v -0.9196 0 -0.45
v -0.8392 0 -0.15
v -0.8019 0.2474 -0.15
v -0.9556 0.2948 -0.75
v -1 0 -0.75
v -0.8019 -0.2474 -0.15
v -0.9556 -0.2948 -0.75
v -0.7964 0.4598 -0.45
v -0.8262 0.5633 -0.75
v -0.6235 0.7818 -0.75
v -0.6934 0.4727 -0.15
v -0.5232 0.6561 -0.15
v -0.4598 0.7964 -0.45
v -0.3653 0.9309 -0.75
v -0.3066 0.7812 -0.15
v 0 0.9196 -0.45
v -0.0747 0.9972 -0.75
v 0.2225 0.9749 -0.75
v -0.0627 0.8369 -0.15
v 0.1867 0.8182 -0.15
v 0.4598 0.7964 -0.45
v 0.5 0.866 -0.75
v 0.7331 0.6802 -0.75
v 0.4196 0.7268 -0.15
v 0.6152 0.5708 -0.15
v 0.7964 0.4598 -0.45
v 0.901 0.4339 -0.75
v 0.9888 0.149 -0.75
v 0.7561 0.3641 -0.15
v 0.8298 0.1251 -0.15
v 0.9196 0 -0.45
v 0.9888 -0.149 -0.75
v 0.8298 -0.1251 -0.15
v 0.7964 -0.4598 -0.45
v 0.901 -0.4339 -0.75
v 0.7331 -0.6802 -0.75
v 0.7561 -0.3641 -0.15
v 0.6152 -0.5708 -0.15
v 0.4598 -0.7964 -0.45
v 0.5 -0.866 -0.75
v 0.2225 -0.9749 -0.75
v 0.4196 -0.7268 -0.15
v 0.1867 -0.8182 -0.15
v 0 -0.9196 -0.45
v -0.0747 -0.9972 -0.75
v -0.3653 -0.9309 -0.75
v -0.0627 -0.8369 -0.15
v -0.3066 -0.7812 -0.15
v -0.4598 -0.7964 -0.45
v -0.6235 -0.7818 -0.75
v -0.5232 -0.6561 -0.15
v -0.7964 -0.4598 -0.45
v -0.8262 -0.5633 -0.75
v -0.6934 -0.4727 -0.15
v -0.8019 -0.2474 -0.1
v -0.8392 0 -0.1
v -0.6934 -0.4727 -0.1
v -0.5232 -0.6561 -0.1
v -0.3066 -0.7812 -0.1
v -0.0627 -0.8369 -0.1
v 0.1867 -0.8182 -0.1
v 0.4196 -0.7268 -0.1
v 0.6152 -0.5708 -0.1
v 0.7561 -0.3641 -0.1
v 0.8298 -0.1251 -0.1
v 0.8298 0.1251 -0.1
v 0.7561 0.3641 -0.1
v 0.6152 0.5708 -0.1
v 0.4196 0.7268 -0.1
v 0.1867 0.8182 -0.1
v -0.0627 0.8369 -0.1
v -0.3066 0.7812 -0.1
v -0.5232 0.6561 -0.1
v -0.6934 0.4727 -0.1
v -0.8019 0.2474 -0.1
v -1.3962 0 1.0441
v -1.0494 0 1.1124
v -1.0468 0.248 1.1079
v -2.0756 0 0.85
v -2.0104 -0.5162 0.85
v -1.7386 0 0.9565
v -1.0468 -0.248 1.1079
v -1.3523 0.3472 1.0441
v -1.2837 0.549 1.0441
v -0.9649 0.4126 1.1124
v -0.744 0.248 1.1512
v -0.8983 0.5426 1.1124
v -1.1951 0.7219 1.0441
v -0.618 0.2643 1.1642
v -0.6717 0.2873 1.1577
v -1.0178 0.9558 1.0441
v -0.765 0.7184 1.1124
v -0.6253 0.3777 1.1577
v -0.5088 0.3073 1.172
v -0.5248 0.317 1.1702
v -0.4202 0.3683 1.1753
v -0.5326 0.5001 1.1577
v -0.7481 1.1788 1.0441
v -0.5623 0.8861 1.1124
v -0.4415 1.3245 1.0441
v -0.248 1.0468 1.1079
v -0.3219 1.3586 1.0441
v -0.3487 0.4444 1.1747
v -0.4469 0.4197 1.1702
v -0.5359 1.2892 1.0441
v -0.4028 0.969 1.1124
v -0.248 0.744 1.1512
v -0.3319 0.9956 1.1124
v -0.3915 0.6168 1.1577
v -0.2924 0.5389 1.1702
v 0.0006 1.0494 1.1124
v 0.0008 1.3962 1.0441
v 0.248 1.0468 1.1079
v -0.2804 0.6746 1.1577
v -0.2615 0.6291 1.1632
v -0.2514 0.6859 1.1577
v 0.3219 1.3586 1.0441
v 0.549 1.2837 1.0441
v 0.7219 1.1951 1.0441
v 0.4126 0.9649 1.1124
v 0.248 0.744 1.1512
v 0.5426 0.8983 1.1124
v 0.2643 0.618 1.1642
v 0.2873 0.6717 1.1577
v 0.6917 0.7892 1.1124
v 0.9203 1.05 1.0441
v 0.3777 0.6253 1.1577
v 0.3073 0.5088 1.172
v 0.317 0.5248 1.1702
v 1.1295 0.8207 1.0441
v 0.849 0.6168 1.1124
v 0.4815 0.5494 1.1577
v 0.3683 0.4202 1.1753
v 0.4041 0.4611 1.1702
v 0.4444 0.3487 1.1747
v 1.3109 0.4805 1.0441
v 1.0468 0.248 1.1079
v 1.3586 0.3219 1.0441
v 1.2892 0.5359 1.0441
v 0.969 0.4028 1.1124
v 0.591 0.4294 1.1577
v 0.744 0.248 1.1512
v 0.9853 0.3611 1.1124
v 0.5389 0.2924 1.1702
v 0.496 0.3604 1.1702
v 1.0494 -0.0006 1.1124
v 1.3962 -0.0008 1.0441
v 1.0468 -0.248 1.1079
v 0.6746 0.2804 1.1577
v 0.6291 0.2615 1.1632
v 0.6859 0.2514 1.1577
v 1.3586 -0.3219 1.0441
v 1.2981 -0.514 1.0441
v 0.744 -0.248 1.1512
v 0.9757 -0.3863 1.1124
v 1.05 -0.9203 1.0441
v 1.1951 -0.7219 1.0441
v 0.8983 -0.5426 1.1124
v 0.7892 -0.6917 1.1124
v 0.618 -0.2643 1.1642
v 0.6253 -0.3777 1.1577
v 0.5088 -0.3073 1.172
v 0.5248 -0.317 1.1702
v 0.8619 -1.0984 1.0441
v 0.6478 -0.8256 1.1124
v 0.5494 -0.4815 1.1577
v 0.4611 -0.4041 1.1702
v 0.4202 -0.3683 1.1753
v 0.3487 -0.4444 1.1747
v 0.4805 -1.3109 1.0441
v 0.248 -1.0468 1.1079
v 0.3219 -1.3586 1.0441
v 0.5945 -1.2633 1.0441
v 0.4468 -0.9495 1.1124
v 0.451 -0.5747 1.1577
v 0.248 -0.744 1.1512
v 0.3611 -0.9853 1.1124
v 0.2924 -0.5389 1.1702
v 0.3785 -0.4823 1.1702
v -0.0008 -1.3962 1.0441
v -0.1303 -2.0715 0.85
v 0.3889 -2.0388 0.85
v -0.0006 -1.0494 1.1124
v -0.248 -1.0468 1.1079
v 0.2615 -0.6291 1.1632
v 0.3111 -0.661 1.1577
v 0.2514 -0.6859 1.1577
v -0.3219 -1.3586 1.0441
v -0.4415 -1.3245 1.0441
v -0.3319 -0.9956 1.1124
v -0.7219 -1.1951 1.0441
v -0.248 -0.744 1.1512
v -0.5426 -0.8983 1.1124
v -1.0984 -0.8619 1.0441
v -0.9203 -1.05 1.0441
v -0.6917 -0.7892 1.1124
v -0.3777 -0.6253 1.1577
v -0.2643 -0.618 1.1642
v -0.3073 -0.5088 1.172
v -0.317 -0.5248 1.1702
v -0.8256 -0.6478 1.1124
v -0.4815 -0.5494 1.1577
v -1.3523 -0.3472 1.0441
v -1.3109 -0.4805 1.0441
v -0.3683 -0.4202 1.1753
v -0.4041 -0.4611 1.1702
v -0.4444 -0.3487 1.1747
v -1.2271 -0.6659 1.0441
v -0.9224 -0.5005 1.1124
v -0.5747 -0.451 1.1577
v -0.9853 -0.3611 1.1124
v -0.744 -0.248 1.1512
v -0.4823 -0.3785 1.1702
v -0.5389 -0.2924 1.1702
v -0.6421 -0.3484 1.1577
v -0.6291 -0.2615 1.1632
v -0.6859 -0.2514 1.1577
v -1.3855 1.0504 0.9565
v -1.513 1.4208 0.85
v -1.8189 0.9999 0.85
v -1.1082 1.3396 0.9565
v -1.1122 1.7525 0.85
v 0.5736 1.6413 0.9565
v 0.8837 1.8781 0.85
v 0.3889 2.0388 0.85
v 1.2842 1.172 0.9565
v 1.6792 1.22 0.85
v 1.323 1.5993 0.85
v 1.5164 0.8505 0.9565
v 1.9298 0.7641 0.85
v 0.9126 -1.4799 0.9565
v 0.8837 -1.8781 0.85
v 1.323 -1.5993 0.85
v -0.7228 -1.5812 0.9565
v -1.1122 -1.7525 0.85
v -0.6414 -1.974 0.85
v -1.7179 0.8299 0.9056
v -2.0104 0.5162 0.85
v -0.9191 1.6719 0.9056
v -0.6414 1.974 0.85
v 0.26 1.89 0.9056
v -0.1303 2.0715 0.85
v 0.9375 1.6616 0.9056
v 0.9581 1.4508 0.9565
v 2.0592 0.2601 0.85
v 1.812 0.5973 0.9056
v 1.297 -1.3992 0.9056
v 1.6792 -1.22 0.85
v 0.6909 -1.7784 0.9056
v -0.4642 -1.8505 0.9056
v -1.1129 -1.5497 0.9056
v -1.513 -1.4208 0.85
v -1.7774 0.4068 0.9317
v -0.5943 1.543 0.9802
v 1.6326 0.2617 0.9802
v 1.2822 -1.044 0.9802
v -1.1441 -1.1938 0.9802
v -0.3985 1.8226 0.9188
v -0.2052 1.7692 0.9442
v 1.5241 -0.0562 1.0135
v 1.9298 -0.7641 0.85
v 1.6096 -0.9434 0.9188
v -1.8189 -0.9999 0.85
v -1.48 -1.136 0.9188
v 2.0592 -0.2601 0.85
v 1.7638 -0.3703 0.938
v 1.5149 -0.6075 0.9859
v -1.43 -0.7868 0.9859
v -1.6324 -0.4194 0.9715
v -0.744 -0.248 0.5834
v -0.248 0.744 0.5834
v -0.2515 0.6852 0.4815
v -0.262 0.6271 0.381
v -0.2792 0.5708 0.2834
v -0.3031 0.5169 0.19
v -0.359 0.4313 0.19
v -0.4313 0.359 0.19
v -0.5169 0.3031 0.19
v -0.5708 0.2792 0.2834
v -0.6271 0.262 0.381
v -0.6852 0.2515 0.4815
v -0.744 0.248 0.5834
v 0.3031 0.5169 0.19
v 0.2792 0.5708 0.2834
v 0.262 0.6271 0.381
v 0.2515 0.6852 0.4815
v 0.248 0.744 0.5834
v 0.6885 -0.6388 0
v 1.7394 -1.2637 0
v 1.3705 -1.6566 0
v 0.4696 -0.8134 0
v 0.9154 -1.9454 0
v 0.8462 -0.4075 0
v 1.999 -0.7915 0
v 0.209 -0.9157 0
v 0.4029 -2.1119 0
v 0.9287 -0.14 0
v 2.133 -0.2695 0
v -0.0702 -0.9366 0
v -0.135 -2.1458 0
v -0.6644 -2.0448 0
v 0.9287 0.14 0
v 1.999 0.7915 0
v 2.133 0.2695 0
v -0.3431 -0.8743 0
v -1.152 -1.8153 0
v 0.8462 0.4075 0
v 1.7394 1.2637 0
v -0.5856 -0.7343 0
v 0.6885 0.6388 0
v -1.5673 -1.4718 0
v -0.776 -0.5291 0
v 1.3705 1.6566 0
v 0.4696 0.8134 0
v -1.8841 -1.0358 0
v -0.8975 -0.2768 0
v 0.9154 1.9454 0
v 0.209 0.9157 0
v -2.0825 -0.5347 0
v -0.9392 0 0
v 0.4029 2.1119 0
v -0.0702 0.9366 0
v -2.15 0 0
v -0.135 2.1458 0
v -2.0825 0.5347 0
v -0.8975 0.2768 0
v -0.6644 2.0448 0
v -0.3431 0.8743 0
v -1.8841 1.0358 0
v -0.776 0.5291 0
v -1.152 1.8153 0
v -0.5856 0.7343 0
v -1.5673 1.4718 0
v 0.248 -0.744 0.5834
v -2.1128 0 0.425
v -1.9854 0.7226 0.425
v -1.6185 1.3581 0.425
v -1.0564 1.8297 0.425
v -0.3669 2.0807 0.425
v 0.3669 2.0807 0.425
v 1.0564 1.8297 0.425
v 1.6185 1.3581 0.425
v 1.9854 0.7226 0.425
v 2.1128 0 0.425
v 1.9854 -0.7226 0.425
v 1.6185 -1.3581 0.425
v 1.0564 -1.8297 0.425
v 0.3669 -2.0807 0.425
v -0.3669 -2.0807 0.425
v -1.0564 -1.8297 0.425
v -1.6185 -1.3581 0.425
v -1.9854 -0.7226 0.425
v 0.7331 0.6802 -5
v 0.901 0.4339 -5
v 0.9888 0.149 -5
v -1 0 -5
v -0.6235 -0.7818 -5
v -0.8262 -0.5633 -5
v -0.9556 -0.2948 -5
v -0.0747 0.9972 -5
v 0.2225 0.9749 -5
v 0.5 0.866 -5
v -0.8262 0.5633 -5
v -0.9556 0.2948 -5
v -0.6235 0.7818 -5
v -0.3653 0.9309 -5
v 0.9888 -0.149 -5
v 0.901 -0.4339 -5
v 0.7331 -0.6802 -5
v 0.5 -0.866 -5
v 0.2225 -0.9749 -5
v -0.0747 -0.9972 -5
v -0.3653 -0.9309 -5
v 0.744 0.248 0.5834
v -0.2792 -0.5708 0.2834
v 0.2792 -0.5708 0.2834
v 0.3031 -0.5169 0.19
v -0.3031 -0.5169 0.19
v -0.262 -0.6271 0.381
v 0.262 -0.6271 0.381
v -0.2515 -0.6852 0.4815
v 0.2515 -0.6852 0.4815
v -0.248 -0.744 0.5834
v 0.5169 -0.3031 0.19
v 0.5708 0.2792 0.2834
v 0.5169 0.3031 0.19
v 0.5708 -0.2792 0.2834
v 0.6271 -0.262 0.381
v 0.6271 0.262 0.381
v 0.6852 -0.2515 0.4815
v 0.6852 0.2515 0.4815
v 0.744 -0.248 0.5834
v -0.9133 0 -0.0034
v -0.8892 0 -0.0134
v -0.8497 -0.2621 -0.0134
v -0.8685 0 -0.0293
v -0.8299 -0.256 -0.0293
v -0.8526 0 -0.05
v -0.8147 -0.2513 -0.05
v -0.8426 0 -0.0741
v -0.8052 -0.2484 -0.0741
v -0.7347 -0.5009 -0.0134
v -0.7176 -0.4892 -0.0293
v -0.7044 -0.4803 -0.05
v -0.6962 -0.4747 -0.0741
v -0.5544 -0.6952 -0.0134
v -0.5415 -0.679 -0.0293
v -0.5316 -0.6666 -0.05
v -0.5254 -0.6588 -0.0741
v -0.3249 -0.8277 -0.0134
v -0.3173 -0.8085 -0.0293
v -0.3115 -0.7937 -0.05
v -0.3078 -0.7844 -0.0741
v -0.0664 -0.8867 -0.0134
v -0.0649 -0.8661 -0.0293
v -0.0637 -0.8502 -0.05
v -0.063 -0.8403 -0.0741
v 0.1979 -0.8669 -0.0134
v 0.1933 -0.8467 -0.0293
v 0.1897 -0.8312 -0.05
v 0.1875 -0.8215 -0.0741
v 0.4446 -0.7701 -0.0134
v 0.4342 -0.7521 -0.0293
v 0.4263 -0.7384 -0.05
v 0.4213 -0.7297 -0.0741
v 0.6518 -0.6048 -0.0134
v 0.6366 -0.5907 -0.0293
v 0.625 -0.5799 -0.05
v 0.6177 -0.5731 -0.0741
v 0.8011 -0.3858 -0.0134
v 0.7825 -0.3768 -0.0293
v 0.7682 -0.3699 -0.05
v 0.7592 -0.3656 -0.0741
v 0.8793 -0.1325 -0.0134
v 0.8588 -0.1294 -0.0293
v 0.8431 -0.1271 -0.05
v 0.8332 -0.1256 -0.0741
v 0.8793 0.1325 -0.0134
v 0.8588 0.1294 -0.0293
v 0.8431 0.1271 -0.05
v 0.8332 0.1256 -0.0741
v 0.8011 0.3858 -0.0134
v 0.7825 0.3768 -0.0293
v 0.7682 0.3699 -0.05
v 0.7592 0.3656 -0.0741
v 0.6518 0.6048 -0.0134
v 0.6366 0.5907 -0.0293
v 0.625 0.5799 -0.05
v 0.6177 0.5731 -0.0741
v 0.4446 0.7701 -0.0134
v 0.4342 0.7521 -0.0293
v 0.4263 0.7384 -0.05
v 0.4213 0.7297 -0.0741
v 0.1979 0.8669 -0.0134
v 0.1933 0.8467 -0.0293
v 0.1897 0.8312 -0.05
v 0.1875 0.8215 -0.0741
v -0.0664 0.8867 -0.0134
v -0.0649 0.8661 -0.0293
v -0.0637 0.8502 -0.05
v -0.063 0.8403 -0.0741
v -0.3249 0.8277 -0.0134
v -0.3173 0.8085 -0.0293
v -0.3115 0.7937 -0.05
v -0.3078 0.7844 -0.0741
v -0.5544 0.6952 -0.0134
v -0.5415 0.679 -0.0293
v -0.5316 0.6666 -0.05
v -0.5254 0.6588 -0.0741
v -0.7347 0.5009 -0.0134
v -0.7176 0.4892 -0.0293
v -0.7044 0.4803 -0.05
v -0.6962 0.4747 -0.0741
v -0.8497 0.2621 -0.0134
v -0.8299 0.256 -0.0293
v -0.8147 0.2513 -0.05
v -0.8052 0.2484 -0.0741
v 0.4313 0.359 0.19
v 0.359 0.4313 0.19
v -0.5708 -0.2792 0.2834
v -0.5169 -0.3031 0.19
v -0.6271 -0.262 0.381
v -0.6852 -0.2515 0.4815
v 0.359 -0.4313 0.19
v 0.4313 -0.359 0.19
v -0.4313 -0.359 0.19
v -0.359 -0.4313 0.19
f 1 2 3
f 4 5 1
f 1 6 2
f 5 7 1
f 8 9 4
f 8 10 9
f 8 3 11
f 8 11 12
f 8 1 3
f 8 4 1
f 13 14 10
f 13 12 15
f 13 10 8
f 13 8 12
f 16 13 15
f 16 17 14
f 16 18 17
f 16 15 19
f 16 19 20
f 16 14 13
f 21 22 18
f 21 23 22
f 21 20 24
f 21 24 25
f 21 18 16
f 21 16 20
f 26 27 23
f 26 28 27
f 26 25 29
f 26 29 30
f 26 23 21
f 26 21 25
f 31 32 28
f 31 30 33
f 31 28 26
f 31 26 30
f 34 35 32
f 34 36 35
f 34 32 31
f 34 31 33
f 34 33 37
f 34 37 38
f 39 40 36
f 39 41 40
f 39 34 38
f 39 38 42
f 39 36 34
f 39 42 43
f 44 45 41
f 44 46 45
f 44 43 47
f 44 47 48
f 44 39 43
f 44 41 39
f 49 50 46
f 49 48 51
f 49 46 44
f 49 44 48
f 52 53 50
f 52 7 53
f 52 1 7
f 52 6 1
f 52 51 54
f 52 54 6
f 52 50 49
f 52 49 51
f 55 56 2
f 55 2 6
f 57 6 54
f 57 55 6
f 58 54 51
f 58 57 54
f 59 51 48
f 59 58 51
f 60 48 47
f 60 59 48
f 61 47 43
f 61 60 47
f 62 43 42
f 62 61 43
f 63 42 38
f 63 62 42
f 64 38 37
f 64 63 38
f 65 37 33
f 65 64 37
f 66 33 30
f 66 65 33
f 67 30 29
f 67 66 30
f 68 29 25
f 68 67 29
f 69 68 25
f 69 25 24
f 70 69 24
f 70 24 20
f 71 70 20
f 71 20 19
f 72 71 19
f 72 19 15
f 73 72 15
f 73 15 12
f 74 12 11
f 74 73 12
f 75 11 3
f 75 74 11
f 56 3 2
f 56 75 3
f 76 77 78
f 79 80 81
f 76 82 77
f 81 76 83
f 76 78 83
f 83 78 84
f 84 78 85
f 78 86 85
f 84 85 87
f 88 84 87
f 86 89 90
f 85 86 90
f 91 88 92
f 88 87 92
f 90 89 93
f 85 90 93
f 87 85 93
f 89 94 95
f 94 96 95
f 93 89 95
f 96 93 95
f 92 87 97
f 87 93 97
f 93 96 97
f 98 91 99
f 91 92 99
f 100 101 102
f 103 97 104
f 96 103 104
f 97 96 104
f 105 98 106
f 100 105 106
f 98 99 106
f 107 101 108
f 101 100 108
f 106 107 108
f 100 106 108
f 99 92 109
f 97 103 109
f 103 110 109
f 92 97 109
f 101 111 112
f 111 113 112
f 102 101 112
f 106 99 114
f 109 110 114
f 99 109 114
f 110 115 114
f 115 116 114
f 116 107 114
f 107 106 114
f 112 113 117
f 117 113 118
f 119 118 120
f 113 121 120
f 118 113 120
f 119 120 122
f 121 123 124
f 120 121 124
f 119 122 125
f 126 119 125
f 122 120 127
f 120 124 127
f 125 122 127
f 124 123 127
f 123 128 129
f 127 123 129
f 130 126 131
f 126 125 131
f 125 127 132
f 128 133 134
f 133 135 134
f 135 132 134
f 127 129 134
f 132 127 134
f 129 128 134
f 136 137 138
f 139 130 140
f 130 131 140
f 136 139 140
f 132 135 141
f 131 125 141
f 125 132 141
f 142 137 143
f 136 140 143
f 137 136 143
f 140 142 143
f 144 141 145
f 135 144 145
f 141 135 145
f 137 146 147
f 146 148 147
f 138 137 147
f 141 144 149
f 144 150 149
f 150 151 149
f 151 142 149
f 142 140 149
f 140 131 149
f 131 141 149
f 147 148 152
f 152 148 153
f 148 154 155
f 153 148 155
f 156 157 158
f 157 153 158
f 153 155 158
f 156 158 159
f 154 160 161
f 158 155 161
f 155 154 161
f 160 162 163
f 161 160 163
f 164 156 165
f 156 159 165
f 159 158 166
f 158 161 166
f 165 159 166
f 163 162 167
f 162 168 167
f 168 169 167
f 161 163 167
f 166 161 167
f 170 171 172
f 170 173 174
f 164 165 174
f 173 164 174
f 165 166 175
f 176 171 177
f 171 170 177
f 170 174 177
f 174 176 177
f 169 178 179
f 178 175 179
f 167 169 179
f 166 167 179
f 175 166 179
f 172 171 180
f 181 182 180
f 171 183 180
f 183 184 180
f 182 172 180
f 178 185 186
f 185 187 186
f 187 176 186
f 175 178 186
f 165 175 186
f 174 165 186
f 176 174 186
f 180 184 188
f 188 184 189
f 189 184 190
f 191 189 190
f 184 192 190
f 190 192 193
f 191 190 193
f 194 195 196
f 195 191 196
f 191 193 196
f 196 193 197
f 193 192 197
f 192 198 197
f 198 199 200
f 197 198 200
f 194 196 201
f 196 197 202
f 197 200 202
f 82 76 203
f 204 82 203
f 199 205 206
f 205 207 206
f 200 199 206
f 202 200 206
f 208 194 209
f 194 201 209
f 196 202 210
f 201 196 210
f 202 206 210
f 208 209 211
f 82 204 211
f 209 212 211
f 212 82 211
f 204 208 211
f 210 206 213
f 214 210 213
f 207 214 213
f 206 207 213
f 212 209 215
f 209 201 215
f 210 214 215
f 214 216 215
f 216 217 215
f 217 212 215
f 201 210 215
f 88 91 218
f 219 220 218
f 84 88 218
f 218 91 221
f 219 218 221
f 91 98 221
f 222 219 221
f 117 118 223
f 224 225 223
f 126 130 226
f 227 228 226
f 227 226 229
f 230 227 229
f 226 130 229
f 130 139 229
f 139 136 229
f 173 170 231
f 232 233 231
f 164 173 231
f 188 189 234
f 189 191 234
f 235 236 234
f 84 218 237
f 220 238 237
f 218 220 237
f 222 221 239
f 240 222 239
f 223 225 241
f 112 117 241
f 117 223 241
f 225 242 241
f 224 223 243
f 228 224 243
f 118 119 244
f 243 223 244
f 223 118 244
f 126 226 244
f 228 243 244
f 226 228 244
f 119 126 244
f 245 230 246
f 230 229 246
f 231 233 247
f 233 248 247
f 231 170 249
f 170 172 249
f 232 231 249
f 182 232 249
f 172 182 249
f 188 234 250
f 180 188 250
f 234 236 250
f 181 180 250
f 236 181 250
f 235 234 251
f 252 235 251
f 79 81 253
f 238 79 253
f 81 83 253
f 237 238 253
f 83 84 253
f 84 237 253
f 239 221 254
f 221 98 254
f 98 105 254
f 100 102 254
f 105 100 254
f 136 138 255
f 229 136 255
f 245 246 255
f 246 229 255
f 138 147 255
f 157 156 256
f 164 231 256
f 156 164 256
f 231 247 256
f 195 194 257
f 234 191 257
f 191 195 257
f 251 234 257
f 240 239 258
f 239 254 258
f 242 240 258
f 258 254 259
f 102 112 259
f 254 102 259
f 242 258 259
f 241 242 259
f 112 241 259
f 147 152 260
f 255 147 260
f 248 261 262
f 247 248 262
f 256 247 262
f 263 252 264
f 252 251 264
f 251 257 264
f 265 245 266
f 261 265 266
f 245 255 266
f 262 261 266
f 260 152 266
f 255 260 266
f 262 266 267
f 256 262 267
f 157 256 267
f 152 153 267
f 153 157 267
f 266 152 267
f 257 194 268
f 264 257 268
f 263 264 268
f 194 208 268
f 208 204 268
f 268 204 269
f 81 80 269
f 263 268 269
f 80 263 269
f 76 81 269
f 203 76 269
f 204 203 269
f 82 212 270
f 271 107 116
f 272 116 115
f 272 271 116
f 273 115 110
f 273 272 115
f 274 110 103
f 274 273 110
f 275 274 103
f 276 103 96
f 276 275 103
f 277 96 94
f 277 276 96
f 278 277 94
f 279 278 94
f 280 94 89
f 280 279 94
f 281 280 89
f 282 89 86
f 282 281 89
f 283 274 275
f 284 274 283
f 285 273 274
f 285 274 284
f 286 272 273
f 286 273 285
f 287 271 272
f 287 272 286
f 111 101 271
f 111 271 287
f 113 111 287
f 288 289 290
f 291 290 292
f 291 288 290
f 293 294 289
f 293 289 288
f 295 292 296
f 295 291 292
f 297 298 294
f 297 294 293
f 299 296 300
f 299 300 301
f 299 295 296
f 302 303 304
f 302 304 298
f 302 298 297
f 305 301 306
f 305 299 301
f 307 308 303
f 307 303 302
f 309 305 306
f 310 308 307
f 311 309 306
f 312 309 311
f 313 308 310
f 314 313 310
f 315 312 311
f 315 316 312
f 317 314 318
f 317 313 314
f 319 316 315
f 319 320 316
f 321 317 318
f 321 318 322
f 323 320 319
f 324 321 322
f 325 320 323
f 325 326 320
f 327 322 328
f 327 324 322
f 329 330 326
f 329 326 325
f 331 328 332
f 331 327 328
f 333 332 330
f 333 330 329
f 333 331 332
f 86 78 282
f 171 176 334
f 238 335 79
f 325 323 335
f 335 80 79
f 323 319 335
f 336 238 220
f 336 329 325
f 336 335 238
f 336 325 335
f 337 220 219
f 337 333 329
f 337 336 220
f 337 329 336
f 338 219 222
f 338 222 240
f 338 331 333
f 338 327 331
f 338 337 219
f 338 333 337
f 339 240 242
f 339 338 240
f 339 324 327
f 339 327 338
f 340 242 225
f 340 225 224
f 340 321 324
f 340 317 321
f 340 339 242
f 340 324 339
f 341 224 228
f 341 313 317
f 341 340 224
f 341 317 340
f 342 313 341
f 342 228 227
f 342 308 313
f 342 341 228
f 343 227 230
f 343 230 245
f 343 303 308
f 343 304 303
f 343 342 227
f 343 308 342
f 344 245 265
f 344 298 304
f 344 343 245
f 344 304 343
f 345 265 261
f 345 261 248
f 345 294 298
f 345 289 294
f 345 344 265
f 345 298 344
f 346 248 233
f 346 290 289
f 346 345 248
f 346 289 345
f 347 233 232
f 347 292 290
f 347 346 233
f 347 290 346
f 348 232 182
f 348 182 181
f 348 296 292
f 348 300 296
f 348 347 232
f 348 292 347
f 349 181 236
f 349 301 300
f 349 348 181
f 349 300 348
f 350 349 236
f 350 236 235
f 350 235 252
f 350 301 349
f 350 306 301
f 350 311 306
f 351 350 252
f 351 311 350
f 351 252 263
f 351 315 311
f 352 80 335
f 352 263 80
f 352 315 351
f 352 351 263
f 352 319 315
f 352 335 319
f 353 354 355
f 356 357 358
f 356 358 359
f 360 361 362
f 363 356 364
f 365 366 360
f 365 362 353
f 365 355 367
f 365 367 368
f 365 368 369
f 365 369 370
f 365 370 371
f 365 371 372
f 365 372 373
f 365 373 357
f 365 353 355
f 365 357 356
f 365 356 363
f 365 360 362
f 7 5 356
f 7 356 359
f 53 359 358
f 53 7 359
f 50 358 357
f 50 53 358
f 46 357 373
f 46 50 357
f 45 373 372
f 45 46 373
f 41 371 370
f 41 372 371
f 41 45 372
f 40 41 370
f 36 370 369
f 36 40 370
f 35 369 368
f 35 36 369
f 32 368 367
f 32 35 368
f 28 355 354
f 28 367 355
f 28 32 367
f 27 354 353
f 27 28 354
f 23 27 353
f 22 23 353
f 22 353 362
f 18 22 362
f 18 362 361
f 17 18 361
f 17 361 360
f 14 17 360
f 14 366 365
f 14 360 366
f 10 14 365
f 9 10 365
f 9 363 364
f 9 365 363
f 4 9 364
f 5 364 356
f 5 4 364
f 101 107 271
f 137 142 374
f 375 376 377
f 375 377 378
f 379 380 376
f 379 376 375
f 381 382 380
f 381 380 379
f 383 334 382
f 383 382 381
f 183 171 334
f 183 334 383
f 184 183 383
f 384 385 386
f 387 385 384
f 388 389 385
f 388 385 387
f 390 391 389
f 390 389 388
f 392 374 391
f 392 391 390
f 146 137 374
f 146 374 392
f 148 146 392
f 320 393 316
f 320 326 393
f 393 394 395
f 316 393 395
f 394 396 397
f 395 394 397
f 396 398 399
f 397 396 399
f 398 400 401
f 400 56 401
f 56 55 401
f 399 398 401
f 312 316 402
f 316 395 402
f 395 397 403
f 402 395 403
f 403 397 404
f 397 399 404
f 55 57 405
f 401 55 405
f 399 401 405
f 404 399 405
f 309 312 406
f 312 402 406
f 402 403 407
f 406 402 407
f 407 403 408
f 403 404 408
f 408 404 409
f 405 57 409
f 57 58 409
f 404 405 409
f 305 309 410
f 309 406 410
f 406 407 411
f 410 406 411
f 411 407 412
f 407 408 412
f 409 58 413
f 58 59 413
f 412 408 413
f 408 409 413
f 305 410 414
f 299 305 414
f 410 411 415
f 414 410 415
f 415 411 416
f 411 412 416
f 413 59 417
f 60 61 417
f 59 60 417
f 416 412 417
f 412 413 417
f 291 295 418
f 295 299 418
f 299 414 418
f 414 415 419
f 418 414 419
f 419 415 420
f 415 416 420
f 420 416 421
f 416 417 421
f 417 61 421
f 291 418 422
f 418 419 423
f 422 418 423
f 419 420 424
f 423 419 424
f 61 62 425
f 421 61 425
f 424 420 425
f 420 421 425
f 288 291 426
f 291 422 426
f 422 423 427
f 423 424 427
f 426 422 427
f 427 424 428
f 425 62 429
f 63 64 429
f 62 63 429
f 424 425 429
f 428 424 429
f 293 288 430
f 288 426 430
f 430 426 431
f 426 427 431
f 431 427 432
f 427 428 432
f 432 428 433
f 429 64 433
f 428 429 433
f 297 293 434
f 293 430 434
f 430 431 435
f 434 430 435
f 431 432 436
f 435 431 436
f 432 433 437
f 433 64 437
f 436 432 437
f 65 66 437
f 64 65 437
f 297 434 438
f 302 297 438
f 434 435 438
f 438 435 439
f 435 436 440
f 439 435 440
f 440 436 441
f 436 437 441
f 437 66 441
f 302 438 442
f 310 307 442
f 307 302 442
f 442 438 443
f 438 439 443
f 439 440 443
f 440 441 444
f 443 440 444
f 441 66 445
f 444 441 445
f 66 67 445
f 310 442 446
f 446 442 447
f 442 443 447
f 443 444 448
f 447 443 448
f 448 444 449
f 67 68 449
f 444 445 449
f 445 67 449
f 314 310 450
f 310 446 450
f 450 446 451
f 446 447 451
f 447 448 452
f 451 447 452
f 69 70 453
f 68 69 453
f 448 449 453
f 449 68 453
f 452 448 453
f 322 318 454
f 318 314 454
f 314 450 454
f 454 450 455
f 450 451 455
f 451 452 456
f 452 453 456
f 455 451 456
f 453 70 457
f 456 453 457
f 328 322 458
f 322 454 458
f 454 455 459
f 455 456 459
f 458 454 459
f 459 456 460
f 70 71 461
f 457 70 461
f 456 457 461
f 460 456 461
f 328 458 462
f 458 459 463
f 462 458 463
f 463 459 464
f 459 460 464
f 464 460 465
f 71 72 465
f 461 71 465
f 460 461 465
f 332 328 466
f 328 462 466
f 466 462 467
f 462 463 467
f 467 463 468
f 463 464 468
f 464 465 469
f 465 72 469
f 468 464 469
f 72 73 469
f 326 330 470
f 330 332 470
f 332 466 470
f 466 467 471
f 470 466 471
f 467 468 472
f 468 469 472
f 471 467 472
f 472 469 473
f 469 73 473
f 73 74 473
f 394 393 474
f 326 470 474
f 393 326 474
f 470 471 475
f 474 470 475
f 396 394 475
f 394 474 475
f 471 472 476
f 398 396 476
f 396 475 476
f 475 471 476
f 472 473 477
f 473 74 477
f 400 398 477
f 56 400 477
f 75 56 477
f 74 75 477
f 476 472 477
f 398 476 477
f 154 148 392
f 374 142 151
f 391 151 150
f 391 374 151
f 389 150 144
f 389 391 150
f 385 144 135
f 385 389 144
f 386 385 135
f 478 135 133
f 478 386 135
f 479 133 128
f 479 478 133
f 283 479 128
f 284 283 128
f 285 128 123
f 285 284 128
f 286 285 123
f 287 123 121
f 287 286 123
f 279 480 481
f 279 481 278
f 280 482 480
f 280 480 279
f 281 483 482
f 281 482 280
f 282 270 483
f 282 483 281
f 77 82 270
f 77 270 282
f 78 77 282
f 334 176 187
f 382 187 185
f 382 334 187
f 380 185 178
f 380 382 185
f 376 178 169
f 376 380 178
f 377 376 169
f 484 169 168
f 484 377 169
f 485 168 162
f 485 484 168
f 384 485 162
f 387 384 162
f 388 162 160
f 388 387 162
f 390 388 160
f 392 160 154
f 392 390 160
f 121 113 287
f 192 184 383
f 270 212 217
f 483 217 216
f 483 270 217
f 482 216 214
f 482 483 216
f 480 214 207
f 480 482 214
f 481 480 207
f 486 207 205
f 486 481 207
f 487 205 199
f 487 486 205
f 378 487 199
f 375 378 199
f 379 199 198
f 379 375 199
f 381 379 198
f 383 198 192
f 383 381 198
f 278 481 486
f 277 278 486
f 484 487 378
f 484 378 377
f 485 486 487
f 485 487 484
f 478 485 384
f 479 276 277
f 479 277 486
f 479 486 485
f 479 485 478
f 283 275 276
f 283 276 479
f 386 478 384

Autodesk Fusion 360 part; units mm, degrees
sketch "Sketch1" plane through (0, 0, 0) normal (0, 1, 0) x (1, 0, 0)
  line L0 (0, -1.2) -> (0, 5)
  line L1 (-2.15, 0) -> (-2.0756, -0.85)
  line L2 (-2.15, 0) -> (-0.8392, 0)
  arc A0 (-2.0756, -0.85) -> (0, -1.2) centre (0, 5.1297) ccw
  line L3 (0, 5) -> (-1, 5)
  line L4 (-1, 5) -> (-1, 0.75)
  line L5 (-1, 0.75) -> (-0.8392, 0.15)
  line L6 (-0.8392, 0.15) -> (-0.8392, 0)
  dimension "d13" = 5
  dimension "d14" = 4.3
  dimension "d18" = 2
  dimension "d23" = 15
  dimension "d53" = 1.2
  dimension "d55" = 4.25
  dimension "d56" = 5
  dimension "d57" = 4.85
  dimension "d60" = 0.85
revolve "Revolve1" add sketch "Sketch1" angle 360 about axis through (0, 0, 1.2) along (0, 0, -1) makes body 1
fillet "Fillet2" radius 0.1 1 edges at (-0.7824, 0.3035, 0) on bodies 1
ref_plane "WorkPlane1" through (0, 0, 1.2) normal (0, 0, 1) x (1, 0, 0)
sketch "Sketch2" plane through (0, 0, 1.2) normal (0, 0, 1) x (1, 0, 0)
  line L0 (-1.1, 0) -> (1.1, 0) construction
  line L1 (0, -1.1) -> (0, 1.1) construction
  line L2 (-0.248, 1.1) -> (0.248, 1.1)
  line L3 (0.248, 1.1) -> (0.248, 0.248)
  line L4 (0.248, 0.248) -> (1.1, 0.248)
  line L5 (1.1, 0.248) -> (1.1, -0.248)
  line L6 (1.1, -0.248) -> (0.248, -0.248)
  line L7 (0.248, -0.248) -> (0.248, -1.1)
  line L8 (0.248, -1.1) -> (-0.248, -1.1)
  line L9 (-0.248, -1.1) -> (-0.248, -0.248)
  line L10 (-0.248, -0.248) -> (-1.1, -0.248)
  line L11 (-1.1, -0.248) -> (-1.1, 0.248)
  line L12 (-1.1, 0.248) -> (-0.248, 0.248)
  line L13 (-0.248, 0.248) -> (-0.248, 1.1)
  dimension "d58" = 0.496
  dimension "d59" = 0.496
  dimension "d61" = 2.2
  dimension "d62" = 2.2
extrude "Extrude1" add sketch "Sketch2" against normal blind 1.01 separate body makes body 2
draft "Draft1" angle -30 neutral plane through (0, 0, 1.2) pull (0, 0, 1) 4 faces at (0.0827, -1.1, 0.8633) (-0.0827, 1.1, 0.8633) (-1.1, -0.0827, 0.8633) (1.1, 0.0827, 0.8633) on bodies 2
fillet "Fillet1" radius 0.496 4 edges at (0.248, -0.248, 0.695) (-0.248, -0.248, 0.695) (-0.248, 0.248, 0.695) (0.248, 0.248, 0.695) on bodies 2
combine "Combine1" operation cut target body 1 tool bodies 2
thread "Thread1" thread offset 0 thread length 10
equation "adsk_nomdia = 2.00 mm"
equation "adsk_nomlen = 5.00 mm"
equation "adsk_headdia = 4.30 mm"
equation "adsk_baseh = 0.85 mm"
equation "adsk_phildia = 2.20 mm"
equation "adsk_midfillet = 0.10 mm"
equation "adsk_thrlen = 4.25 mm"
equation "adsk_phildepth = 1.01 mm"
equation "adsk_thrrun = 0.60 mm"
equation "adsk_thrang = 15.00 deg"
equation "adsk_headang = 5.00 deg"
equation "d13 = adsk_headang"
equation "d14 = adsk_headdia"
equation "adsk_ovalh = 0.35 mm"
equation "d18 = adsk_nomdia"
equation "d23 = adsk_thrang"
equation "d32 = adsk_baseh + adsk_ovalh"
equation "adsk_philwidth = 0.496 mm"
equation "d48 = adsk_philwidth"
equation "d52 = adsk_midfillet"
equation "d53 = adsk_baseh + adsk_ovalh"
equation "d55 = adsk_thrlen"
equation "d56 = adsk_nomlen"
equation "d57 = adsk_thrlen + adsk_thrrun"
equation "d58 = adsk_philwidth"
equation "d59 = adsk_philwidth"
equation "d60 = adsk_baseh"
equation "d61 = adsk_phildia"
equation "d62 = adsk_phildia"
properties part number "arrangementsContainer"
